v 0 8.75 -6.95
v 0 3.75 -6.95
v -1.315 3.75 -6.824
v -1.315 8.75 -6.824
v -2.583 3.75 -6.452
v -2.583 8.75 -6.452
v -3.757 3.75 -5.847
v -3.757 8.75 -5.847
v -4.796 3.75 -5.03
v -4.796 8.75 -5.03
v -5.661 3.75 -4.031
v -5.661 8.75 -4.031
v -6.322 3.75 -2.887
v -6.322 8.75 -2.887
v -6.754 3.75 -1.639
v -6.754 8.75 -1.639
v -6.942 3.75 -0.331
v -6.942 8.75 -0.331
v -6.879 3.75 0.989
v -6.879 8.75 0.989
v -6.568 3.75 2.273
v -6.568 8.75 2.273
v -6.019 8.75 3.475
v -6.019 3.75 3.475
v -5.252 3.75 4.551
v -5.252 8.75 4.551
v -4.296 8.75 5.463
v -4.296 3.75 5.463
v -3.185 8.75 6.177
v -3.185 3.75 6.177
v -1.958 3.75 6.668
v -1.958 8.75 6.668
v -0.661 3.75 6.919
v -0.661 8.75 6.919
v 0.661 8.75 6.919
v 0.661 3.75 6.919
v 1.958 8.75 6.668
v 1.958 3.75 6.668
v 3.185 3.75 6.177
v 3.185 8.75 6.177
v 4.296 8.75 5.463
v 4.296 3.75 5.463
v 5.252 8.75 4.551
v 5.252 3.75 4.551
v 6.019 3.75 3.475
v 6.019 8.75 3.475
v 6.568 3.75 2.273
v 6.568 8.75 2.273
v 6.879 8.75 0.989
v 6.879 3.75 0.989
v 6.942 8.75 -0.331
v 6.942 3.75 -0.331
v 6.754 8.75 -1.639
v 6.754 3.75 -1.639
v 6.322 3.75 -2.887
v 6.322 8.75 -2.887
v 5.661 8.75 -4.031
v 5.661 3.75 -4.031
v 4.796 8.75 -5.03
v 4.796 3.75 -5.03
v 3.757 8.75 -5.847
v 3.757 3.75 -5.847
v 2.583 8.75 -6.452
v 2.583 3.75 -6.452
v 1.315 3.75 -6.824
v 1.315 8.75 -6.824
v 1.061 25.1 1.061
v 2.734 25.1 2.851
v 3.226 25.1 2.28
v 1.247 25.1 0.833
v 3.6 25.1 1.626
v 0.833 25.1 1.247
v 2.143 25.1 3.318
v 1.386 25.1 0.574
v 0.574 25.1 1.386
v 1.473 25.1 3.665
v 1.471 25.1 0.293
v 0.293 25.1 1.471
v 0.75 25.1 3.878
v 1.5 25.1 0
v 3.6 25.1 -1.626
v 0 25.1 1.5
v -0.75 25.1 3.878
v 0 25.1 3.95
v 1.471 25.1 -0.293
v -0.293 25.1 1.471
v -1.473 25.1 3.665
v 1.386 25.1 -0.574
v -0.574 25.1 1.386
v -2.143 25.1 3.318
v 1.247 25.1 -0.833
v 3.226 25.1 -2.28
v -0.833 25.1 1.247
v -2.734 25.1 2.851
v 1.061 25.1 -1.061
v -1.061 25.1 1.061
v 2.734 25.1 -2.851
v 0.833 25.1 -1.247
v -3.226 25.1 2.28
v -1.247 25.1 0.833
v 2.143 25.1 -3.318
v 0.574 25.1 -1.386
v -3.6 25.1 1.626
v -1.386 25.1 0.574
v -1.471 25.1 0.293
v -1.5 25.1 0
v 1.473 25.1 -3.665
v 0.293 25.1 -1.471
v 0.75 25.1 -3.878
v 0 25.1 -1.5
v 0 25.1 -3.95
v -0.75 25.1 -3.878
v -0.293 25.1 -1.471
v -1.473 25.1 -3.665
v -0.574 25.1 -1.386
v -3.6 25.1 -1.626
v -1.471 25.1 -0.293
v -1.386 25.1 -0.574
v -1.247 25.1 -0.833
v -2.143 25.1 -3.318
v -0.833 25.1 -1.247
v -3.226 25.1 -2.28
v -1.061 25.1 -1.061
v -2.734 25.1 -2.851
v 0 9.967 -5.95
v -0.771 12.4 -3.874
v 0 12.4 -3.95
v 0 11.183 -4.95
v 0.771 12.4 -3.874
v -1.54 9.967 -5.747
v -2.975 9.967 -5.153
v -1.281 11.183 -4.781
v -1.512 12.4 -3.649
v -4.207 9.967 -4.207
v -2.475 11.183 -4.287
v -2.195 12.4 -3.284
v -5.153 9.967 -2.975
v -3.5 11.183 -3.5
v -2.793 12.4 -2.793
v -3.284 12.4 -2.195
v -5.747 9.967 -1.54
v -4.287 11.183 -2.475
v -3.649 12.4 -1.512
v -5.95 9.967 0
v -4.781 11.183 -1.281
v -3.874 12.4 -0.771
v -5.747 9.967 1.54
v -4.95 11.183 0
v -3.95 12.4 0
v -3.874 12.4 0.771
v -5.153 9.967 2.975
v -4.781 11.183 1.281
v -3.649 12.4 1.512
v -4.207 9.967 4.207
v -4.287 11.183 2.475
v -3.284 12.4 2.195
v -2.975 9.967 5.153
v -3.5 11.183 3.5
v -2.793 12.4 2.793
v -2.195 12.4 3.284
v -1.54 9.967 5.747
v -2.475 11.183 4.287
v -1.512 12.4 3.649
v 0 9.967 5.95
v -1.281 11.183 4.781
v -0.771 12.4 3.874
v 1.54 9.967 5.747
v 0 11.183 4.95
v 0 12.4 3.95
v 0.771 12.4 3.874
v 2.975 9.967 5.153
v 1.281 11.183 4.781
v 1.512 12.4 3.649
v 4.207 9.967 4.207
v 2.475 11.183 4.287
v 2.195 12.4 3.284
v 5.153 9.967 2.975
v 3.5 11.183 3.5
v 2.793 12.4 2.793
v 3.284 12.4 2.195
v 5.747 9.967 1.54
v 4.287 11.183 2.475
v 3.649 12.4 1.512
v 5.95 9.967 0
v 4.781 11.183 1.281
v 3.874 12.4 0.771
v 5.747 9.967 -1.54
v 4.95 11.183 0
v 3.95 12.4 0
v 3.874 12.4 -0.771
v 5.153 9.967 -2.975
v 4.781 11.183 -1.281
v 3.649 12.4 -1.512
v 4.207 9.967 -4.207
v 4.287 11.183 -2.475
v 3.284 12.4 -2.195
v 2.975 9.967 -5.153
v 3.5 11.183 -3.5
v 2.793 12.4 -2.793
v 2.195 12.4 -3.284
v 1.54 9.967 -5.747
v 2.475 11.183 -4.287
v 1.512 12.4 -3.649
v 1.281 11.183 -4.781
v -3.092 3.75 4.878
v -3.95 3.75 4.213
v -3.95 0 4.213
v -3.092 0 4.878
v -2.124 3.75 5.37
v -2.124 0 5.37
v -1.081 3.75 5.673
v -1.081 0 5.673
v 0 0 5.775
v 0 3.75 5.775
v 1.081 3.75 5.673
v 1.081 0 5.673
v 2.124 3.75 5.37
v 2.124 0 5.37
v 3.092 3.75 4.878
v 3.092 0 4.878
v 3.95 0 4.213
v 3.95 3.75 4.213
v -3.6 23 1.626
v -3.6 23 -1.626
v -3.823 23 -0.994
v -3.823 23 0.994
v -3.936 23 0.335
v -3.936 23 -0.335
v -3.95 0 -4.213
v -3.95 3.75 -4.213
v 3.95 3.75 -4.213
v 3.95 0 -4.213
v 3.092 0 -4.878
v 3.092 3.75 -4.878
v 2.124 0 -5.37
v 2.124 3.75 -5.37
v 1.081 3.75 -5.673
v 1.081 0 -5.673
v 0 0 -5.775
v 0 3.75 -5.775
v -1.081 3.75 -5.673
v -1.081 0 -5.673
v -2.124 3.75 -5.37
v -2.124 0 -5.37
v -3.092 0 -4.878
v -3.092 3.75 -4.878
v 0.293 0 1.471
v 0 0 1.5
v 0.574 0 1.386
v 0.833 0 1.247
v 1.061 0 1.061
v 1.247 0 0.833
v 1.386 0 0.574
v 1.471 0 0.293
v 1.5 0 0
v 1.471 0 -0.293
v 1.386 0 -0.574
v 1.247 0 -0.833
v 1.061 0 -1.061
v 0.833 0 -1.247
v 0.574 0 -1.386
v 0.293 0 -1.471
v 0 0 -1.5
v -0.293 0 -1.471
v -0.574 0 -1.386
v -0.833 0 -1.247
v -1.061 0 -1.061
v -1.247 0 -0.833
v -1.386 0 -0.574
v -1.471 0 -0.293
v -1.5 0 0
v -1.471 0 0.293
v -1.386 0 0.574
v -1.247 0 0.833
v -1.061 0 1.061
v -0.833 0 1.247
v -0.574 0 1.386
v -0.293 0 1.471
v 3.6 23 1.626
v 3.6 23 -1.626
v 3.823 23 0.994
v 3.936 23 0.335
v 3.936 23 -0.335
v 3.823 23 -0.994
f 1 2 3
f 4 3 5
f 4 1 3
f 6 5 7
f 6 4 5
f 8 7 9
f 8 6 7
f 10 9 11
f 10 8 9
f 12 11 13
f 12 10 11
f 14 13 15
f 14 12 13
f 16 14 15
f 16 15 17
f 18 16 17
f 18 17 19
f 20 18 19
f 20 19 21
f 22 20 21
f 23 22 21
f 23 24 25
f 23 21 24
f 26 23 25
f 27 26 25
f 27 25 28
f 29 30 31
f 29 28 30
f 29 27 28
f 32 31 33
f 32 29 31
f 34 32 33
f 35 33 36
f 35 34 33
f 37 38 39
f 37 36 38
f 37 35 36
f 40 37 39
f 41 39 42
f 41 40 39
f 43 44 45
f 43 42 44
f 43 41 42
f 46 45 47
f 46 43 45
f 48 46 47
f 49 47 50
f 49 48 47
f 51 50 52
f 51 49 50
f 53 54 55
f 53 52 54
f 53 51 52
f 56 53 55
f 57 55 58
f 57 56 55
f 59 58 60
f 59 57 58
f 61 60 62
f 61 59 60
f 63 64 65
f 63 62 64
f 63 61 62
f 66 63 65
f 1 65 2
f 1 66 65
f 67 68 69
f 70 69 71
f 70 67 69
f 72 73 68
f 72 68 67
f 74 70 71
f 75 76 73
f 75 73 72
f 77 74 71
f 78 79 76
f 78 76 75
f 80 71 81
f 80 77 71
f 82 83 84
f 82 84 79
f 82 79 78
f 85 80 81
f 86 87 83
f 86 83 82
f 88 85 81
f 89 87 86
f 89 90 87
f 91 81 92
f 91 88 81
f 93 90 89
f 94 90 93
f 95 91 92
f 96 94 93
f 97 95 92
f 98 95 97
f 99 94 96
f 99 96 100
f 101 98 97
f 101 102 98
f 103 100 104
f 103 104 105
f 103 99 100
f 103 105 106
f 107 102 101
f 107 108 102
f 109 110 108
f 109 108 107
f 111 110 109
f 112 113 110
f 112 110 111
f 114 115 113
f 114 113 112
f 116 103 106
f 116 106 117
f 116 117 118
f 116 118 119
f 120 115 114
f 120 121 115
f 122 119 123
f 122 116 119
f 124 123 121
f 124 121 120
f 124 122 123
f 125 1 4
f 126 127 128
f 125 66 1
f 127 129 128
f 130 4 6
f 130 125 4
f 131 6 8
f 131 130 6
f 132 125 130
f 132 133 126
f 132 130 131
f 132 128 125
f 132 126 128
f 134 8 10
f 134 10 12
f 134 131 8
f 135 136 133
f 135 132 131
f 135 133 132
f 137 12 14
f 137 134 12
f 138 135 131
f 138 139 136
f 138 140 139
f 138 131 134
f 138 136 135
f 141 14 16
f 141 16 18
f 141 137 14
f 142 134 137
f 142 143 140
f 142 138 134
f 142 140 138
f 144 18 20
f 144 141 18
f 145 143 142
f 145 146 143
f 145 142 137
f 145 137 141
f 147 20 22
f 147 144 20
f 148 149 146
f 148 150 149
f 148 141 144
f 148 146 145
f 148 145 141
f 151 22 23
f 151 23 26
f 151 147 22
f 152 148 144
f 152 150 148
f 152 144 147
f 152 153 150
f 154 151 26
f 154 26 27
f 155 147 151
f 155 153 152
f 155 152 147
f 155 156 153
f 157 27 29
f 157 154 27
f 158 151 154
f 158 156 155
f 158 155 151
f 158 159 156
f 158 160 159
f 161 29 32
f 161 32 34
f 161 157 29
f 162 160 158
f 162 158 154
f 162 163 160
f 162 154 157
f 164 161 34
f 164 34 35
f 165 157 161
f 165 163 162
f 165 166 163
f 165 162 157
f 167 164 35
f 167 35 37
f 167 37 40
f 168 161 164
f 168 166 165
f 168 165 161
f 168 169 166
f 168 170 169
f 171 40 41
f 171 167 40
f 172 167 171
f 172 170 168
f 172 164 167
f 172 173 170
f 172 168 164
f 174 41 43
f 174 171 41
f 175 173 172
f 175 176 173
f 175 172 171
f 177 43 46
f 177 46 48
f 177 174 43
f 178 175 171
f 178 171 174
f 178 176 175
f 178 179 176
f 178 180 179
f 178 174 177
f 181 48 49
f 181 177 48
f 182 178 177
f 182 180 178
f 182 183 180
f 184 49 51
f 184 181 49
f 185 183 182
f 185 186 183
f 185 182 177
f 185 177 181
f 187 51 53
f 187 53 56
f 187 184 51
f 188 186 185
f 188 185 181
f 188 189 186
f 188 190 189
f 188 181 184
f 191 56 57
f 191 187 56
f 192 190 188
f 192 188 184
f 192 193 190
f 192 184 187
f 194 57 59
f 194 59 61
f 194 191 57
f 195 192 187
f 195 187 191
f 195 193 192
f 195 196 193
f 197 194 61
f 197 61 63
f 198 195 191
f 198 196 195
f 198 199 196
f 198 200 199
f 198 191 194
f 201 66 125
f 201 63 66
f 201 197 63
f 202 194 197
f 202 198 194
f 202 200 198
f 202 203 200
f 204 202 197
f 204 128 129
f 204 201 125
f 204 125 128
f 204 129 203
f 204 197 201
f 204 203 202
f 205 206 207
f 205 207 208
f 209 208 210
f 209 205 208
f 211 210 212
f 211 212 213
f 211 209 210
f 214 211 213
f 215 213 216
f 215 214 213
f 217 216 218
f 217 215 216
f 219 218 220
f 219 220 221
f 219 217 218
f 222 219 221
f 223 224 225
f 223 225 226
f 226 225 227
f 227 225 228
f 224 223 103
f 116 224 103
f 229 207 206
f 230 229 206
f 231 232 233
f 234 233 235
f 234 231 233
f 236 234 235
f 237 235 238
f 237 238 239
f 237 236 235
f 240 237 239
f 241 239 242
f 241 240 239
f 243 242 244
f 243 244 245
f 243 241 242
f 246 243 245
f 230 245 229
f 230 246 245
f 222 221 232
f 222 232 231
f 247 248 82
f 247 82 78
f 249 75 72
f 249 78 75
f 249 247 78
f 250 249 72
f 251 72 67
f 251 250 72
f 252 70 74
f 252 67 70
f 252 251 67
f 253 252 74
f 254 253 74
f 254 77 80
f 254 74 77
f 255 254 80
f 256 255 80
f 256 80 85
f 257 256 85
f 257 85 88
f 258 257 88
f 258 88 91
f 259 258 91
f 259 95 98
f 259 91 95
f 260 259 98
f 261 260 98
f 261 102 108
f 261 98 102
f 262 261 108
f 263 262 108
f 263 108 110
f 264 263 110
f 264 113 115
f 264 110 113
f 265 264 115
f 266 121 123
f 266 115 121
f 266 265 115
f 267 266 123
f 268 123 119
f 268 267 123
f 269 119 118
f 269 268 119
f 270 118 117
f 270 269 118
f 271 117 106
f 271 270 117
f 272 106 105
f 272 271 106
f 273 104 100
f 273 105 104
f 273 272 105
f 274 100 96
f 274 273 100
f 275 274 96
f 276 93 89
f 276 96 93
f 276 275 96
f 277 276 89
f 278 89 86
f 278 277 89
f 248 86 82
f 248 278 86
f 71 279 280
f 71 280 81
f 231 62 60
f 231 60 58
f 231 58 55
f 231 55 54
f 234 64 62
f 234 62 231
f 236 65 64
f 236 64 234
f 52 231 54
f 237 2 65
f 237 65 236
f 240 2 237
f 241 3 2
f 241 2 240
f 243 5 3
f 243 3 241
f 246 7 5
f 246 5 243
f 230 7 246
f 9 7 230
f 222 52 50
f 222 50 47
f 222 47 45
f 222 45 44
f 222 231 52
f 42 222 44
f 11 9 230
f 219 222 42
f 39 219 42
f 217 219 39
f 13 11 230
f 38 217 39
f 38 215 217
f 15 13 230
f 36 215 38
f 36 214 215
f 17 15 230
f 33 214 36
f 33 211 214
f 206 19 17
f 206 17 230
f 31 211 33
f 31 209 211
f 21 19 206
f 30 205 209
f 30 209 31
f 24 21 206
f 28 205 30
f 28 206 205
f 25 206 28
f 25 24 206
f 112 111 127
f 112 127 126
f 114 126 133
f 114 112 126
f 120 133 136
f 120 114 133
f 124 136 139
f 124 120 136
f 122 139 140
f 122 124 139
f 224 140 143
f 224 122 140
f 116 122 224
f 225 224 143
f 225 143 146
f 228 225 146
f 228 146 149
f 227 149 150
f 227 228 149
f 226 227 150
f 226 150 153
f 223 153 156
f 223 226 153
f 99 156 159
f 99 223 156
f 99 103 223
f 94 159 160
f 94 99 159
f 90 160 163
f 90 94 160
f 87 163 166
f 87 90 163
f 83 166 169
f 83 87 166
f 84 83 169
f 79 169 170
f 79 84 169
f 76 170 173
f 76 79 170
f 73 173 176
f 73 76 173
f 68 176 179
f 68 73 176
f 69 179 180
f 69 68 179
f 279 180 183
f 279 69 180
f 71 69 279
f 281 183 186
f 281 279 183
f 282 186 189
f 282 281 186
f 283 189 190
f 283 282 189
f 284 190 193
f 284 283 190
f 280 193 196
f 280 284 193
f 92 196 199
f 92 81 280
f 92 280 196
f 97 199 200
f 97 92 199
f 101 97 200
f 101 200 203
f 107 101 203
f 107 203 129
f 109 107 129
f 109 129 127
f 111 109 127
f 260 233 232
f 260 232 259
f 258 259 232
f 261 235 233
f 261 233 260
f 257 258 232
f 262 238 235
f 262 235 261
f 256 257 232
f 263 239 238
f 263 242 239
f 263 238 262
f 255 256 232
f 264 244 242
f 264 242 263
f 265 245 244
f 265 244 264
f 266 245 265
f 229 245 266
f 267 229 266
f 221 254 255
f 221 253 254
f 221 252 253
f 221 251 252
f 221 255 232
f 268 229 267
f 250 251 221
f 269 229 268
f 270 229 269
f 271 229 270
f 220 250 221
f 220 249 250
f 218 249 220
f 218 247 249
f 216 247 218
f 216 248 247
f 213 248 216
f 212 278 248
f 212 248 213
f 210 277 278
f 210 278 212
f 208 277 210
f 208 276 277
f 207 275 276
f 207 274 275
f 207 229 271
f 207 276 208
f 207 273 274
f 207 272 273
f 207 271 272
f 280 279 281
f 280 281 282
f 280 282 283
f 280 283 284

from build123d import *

# Parameters (mm, degrees)
CORTE_EXTRUS_O1_DEPTH      = 27.95579715
CORTE_EXTRUS_O1_DEPTH_BACK = 27.95579715
ESBO_O2_W                  = 1.825
ESBO_O2_H                  = 3.75
ESBO_O2_W_2                = 0.35
ESBO_O2_H_2                = 2.1
CORTE_EXTRUS_O2_DEPTH      = 27.95579715
CORTE_EXTRUS_O2_DEPTH_BACK = 27.95579715
ESBO_O3_R                  = 1.5


with BuildPart() as part:
    # Esboço1 → Revolução1 (revolve)
    with BuildSketch(Plane.XY, mode=Mode.PRIVATE) as revolu_o1_sk:
        Polygon((-5.775, 0), (-5.775, 3.75), (-6.95, 3.75), (-6.95, 8.75), (-3.95, 12.4), (-3.95, 25.1), (0, 25.1), (0, 0), align=None)
    revolve(revolu_o1_sk.sketch.rotate(Axis((0, 0, 0), (0, 1, 0)), 270), axis=Axis((0, 0, 0), (0, 1, 0)))

    # Esboço2 → Corte-extrusão1 (cut, two sides: drawn at the far end of the back side and taken through both)
    with BuildSketch(Plane.XY.offset(-CORTE_EXTRUS_O1_DEPTH_BACK)):
        with Locations((-4.8625, 1.875)):
            Rectangle(ESBO_O2_W, ESBO_O2_H)
        with Locations((-3.775, 24.05)):
            Rectangle(ESBO_O2_W_2, ESBO_O2_H_2)
        with Locations((3.775, 24.05)):
            Rectangle(ESBO_O2_W_2, ESBO_O2_H_2)
        with Locations((4.8625, 1.875)):
            Rectangle(ESBO_O2_W, ESBO_O2_H)
    extrude(amount=CORTE_EXTRUS_O1_DEPTH + CORTE_EXTRUS_O1_DEPTH_BACK, mode=Mode.SUBTRACT)

    # Esboço3 → Corte-extrusão2 (cut, two sides: drawn at the far end of the back side and taken through both)
    with BuildSketch(Plane(origin=(0, 0, 0), x_dir=(1, 0, 0), z_dir=(0, 1, 0)).offset(-CORTE_EXTRUS_O2_DEPTH_BACK)):
        with Locations(Location((0, 0, 0), (0, 0, 270))):
            Circle(ESBO_O3_R)
    extrude(amount=CORTE_EXTRUS_O2_DEPTH + CORTE_EXTRUS_O2_DEPTH_BACK, mode=Mode.SUBTRACT)


solid = part.part
